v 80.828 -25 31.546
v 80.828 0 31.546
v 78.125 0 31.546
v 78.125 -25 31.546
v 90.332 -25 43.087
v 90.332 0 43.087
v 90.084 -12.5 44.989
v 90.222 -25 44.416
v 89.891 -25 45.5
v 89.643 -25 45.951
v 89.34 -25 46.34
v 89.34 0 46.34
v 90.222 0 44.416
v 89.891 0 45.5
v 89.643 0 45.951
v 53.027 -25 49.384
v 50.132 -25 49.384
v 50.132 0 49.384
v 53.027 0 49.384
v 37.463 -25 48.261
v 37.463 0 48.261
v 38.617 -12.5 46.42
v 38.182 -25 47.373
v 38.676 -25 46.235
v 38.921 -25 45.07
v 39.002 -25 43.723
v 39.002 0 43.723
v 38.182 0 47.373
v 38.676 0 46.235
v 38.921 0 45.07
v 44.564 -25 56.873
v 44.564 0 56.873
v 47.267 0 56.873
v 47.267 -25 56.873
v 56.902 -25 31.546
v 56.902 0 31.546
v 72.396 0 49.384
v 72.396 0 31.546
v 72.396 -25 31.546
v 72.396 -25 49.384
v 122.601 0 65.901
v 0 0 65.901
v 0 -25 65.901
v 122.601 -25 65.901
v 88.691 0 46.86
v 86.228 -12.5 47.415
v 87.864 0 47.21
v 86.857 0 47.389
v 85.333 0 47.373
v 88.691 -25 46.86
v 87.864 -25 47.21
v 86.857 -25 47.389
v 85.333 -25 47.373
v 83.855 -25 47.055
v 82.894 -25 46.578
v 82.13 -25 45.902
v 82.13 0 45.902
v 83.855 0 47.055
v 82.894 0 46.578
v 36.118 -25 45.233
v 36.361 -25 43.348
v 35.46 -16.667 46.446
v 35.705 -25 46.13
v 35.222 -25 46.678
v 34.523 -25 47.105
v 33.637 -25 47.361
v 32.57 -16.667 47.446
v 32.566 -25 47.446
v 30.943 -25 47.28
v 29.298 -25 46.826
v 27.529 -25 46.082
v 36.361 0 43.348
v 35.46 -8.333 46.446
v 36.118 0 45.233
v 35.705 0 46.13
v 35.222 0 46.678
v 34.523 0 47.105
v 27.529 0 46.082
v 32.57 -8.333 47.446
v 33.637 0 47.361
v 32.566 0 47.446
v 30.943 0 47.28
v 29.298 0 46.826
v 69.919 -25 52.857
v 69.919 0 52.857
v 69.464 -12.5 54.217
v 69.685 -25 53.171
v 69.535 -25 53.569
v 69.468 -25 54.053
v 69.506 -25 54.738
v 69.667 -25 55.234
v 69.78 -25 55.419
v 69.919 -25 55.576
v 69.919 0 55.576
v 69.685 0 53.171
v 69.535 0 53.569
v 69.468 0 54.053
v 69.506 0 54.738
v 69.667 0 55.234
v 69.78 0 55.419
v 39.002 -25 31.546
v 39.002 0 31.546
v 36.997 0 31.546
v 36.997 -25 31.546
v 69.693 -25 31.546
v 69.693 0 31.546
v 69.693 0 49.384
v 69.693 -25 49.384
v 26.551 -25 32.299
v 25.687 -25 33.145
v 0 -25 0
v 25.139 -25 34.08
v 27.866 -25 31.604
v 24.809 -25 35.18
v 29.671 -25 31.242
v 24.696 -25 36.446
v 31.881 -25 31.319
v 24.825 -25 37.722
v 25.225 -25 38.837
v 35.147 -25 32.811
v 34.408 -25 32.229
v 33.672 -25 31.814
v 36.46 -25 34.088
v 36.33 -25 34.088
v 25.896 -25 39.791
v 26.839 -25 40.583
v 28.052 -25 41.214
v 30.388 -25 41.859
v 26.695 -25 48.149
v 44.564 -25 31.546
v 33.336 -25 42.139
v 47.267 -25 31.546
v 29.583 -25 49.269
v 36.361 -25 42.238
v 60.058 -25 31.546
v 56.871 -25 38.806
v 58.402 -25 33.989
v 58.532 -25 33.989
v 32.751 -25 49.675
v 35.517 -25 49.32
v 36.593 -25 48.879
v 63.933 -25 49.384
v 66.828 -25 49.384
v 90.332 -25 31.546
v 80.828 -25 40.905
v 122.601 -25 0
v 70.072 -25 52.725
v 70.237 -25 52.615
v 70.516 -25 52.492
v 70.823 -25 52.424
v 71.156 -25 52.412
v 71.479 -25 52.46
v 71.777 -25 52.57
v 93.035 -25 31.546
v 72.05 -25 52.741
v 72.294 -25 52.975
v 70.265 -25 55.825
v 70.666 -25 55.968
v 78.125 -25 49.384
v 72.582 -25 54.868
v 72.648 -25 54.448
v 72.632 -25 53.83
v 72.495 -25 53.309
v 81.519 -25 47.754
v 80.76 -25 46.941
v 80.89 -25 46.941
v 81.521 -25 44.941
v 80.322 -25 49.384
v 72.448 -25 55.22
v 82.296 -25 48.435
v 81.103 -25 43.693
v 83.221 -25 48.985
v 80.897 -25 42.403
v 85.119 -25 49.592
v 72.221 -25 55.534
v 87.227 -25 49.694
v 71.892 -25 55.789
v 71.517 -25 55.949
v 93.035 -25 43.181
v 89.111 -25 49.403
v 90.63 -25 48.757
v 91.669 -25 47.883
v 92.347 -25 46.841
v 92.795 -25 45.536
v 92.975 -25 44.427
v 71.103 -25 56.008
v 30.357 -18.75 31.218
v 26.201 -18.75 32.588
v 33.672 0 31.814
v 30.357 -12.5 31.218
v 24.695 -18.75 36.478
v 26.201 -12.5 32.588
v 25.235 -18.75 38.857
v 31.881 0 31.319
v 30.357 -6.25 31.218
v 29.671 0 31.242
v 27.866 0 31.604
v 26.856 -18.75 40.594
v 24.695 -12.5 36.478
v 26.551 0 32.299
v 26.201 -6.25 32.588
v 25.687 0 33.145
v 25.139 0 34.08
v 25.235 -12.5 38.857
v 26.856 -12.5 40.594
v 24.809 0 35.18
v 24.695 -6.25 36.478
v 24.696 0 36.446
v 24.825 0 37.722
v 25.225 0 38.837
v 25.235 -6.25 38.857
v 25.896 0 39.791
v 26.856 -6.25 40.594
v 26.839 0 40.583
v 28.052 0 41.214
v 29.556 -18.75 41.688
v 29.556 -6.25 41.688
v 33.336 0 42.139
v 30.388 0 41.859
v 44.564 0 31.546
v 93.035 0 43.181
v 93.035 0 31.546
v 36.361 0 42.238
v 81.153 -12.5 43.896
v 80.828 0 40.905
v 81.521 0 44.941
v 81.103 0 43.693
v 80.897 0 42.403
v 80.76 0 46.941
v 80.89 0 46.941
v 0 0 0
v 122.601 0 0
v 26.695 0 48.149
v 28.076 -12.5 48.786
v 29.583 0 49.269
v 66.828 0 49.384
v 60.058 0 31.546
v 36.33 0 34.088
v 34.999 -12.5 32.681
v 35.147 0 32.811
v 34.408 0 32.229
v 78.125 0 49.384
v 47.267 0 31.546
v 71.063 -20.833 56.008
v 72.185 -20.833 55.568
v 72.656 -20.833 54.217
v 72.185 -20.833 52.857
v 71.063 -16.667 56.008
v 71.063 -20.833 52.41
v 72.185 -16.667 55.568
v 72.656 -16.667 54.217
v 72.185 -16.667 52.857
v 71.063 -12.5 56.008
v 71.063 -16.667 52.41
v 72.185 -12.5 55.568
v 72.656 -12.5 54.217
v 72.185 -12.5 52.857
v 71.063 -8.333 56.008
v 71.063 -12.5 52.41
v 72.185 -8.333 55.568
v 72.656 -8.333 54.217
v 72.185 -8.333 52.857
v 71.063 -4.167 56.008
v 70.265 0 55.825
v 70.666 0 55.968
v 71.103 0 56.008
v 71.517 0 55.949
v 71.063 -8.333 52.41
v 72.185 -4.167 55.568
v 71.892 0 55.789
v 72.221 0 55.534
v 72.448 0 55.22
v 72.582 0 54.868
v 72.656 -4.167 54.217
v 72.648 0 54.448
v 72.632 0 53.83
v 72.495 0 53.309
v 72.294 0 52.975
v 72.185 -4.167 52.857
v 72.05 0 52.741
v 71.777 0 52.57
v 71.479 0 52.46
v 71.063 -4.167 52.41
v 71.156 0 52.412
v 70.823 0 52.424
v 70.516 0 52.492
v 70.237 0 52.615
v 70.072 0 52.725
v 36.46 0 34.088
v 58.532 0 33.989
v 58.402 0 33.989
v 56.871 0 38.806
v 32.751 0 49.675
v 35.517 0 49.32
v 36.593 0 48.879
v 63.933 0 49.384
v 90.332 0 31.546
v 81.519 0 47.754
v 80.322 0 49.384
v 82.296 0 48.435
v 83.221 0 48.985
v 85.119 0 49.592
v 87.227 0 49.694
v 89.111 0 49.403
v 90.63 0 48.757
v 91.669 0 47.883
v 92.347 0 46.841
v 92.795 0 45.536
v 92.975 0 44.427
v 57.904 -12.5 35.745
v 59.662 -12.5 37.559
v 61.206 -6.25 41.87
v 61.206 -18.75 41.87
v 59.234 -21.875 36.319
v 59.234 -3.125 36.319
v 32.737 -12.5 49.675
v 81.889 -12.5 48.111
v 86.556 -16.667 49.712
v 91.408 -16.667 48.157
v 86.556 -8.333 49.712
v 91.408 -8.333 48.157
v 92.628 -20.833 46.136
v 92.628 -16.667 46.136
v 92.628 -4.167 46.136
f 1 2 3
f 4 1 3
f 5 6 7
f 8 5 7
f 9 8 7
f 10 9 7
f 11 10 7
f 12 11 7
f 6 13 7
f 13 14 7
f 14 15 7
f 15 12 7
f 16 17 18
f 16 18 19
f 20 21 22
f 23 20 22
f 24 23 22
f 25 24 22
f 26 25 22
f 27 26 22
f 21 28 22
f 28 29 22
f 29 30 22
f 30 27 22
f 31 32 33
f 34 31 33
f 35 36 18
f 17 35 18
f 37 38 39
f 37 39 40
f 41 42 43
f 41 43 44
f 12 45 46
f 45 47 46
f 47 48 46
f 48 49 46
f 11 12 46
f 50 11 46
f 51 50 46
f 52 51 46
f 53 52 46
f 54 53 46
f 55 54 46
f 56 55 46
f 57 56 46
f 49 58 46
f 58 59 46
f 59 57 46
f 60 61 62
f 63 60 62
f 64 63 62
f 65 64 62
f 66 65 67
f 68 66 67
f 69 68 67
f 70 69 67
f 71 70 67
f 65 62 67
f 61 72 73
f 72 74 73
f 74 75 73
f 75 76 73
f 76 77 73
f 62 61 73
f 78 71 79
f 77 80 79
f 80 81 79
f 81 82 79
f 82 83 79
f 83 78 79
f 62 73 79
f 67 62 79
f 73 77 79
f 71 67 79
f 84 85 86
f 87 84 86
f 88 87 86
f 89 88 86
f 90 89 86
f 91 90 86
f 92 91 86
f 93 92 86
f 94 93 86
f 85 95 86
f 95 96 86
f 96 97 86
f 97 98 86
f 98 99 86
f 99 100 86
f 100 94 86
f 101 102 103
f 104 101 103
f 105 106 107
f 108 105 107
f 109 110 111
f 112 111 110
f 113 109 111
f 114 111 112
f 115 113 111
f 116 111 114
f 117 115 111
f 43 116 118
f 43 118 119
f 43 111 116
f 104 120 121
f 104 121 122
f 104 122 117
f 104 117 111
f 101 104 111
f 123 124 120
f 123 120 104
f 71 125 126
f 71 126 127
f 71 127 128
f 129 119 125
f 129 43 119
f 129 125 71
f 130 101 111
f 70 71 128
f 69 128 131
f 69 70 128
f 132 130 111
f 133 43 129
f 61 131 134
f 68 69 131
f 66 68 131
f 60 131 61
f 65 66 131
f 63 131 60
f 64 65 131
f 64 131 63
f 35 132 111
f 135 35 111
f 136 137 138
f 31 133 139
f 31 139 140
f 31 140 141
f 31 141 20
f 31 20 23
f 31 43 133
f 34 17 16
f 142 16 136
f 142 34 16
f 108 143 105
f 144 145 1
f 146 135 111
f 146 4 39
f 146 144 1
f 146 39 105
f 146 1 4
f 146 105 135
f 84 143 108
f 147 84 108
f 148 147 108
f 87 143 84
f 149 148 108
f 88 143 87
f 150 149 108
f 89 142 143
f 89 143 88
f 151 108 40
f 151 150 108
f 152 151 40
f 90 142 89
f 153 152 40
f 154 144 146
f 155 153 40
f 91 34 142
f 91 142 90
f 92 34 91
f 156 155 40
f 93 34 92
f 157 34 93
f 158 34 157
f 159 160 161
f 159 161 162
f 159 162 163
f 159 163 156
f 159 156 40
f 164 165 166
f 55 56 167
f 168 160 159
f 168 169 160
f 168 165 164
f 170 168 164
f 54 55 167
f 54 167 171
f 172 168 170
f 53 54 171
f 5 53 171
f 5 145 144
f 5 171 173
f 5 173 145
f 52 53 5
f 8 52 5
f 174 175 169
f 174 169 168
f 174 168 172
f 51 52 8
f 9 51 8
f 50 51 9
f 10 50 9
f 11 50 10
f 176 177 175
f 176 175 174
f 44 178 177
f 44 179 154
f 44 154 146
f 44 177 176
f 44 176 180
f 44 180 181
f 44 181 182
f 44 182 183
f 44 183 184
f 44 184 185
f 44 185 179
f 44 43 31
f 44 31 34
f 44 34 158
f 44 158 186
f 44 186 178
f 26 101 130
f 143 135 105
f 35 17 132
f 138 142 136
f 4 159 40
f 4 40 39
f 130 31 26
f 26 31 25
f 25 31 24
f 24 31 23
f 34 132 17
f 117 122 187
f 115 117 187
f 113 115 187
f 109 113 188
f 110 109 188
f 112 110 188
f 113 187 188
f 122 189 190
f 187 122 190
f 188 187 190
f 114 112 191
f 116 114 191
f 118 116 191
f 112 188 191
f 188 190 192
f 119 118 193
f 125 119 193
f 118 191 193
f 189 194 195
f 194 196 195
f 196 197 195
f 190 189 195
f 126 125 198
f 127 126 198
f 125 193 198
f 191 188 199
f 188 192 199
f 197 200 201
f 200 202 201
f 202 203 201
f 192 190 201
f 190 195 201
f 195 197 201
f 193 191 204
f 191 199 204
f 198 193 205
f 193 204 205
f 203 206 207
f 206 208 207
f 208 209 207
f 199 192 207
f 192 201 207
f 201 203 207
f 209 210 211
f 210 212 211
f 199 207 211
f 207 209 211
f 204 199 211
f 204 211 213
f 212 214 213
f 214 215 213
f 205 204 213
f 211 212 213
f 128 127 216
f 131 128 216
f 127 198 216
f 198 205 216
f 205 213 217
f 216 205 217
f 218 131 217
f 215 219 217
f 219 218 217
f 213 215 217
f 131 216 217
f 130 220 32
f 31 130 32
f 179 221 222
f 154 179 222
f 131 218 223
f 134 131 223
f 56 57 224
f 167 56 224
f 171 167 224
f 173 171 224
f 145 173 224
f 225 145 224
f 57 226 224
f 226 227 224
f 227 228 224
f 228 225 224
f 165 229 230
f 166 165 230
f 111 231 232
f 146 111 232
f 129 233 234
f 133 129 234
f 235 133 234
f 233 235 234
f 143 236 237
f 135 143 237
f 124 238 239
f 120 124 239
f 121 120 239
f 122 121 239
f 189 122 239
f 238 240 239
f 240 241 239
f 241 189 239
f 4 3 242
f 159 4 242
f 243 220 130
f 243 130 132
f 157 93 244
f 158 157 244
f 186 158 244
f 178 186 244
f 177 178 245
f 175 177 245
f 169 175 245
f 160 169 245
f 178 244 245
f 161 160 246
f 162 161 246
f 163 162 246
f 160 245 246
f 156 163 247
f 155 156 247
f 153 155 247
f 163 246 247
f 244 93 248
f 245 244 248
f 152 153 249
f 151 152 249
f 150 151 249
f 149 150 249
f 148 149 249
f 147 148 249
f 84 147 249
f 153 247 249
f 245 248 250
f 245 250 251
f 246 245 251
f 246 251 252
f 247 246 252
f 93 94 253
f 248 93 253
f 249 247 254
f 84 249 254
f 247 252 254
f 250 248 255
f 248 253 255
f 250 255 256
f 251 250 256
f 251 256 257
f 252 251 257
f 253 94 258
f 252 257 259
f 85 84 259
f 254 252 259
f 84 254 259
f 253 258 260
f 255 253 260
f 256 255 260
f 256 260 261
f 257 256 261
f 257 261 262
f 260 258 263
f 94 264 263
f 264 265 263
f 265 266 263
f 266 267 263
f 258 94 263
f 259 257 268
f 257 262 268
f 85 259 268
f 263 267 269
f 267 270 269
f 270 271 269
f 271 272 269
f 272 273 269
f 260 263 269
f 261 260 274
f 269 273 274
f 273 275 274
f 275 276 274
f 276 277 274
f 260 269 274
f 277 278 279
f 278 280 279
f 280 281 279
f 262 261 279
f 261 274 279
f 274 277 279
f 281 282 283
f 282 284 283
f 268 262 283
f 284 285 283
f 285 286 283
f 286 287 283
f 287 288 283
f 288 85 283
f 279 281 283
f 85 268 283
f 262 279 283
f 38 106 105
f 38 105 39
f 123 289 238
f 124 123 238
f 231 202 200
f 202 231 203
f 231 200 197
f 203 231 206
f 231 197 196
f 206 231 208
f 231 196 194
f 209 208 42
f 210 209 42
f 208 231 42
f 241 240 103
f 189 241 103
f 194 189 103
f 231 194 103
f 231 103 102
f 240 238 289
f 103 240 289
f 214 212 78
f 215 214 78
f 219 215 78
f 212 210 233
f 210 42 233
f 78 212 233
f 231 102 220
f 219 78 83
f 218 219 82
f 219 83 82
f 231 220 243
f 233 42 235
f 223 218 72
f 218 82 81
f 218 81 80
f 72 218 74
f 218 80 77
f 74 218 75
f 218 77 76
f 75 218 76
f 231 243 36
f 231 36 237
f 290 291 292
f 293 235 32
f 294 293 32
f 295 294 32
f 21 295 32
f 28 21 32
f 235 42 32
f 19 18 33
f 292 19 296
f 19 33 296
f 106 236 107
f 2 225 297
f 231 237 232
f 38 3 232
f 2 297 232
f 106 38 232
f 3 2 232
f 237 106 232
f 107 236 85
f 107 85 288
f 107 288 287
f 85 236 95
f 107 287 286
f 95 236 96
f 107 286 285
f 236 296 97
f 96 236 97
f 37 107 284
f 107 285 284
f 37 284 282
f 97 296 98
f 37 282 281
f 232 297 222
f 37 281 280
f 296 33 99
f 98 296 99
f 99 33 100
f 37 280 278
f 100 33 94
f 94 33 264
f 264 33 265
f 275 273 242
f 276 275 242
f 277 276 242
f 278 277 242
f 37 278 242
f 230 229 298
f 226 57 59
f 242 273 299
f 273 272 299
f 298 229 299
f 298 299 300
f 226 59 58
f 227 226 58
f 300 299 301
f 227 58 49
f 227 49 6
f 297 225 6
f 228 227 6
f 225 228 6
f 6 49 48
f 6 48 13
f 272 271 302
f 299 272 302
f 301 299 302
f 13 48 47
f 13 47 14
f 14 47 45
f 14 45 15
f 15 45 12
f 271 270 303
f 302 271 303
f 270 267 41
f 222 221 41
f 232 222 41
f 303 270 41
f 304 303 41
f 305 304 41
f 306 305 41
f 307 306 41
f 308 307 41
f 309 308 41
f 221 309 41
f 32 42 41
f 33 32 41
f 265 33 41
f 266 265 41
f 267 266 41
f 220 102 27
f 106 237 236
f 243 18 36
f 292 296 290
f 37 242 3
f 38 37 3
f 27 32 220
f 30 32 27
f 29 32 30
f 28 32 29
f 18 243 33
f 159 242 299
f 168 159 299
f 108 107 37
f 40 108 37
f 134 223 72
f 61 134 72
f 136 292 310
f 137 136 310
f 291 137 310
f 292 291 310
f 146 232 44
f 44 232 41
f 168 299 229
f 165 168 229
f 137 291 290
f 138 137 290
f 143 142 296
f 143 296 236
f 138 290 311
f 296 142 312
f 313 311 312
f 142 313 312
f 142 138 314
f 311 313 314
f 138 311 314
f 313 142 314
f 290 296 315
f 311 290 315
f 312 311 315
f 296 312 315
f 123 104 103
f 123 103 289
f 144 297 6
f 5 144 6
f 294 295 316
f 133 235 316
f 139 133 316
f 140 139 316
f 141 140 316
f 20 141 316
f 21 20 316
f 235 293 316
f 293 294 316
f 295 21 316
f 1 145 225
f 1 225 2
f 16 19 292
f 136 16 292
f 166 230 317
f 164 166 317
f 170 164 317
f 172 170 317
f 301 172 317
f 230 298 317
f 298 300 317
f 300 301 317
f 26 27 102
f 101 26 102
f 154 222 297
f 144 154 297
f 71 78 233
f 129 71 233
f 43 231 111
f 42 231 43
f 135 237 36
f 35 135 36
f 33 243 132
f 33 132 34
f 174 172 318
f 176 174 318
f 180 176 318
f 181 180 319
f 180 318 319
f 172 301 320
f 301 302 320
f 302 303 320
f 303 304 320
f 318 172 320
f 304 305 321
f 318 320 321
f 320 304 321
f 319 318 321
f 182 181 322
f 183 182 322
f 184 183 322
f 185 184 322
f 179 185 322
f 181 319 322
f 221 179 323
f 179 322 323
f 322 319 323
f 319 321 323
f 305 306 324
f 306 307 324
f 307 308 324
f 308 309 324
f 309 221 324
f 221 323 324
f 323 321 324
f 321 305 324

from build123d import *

# Parameters (mm, degrees)
F1_W     = 122.6013228297
F1_H     = 65.9010410309
F1_W_2   = 2.7029693592
F1_H_2   = 25.326666655
F1_H_3   = 17.8375145576
F2_DEPTH = 25


with BuildPart() as f2:
    # F1 (on face) → F2 (new body)
    with BuildSketch(Plane.XZ):
        with Locations((61.3006614149, 32.9505205154)):
            Rectangle(F1_W, F1_H)
        with BuildLine():
            Line((39.001939275, 31.5462090075), (36.9968463977, 31.5462090075))
            Line((36.9968463977, 31.5462090075), (36.4604189526, 34.0877293299))
            Line((36.4604189526, 34.0877293299), (36.3302181164, 34.0877293299))
            add(Edge.make_bspline(
                [(36.3302181164, 34.0877293299), (34.9969615539, 32.4107425598), (33.6715170415, 31.81442273)],
                knots=[0, 0, 0, 1, 1, 1], degree=2))
            add(Edge.make_bspline(
                [(33.6715170415, 31.81442273), (32.3460725291, 31.2181029003), (30.3566037522, 31.2181029003)],
                knots=[0, 0, 0, 1, 1, 1], degree=2))
            add(Edge.make_bspline(
                [(30.3566037522, 31.2181029003), (27.7057147274, 31.2181029003), (26.2005930611, 32.587815697)],
                knots=[0, 0, 0, 1, 1, 1], degree=2))
            add(Edge.make_bspline(
                [(26.2005930611, 32.587815697), (24.6954713948, 33.9575284937), (24.6954713948, 36.4782166823)],
                knots=[0, 0, 0, 1, 1, 1], degree=2))
            add(Edge.make_bspline(
                [(24.6954713948, 36.4782166823), (24.6954713948, 41.8789473673), (33.3355988842, 42.1393490396)],
                knots=[0, 0, 0, 1, 1, 1], degree=2))
            Line((33.3355988842, 42.1393490396), (36.3614663171, 42.2383016751))
            Line((36.3614663171, 42.2383016751), (36.3614663171, 43.3476127995))
            add(Edge.make_bspline(
                [(36.3614663171, 43.3476127995), (36.3614663171, 45.4464502788), (35.4604765307, 46.4463927007)],
                knots=[0, 0, 0, 1, 1, 1], degree=2))
            add(Edge.make_bspline(
                [(35.4604765307, 46.4463927007), (34.5594867443, 47.4463351226), (32.5700179674, 47.4463351226)],
                knots=[0, 0, 0, 1, 1, 1], degree=2))
            add(Edge.make_bspline(
                [(32.5700179674, 47.4463351226), (30.3409796519, 47.4463351226), (27.5286415902, 46.0818303594)],
                knots=[0, 0, 0, 1, 1, 1], degree=2))
            Line((27.5286415902, 46.0818303594), (26.6953562386, 48.149419638))
            add(Edge.make_bspline(
                [(26.6953562386, 48.149419638), (28.0129887008, 48.8629202203), (29.5832107853, 49.2691468292)],
                knots=[0, 0, 0, 1, 1, 1], degree=2))
            add(Edge.make_bspline(
                [(29.5832107853, 49.2691468292), (31.1534328697, 49.6753734381), (32.7366750377, 49.6753734381)],
                knots=[0, 0, 0, 1, 1, 1], degree=2))
            add(Edge.make_bspline(
                [(32.7366750377, 49.6753734381), (35.9239915075, 49.6753734381), (37.4629653913, 48.2613923571)],
                knots=[0, 0, 0, 1, 1, 1], degree=2))
            add(Edge.make_bspline(
                [(37.4629653913, 48.2613923571), (39.001939275, 46.8474112762), (39.001939275, 43.7225912077)],
                knots=[0, 0, 0, 1, 1, 1], degree=2))
            Line((39.001939275, 43.7225912077), (39.001939275, 31.5462090075))
        make_face(mode=Mode.SUBTRACT)
        with BuildLine():
            Line((60.0580185031, 31.5462090075), (56.9019502339, 31.5462090075))
            Line((56.9019502339, 31.5462090075), (50.1315067522, 49.3837235651))
            Line((50.1315067522, 49.3837235651), (53.027173349, 49.3837235651))
            Line((53.027173349, 49.3837235651), (56.8707020332, 38.8062076333))
            add(Edge.make_bspline(
                [(56.8707020332, 38.8062076333), (58.1727103951, 35.0928797852), (58.4018638668, 33.9887766944)],
                knots=[0, 0, 0, 1, 1, 1], degree=2))
            Line((58.4018638668, 33.9887766944), (58.532064703, 33.9887766944))
            add(Edge.make_bspline(
                [(58.532064703, 33.9887766944), (58.7091378402, 34.8481022132), (59.6622079611, 37.5588836226)],
                knots=[0, 0, 0, 1, 1, 1], degree=2))
            add(Edge.make_bspline(
                [(59.6622079611, 37.5588836226), (60.615278082, 40.269665032), (63.932795388, 49.3837235651)],
                knots=[0, 0, 0, 1, 1, 1], degree=2))
            Line((63.932795388, 49.3837235651), (66.8284619848, 49.3837235651))
            Line((66.8284619848, 49.3837235651), (60.0580185031, 31.5462090075))
        make_face(mode=Mode.SUBTRACT)
        with Locations((45.9156036765, 44.209542335)):
            Rectangle(F1_W_2, F1_H_2, mode=Mode.SUBTRACT)
        with Locations((71.0443650605, 40.4649662863)):
            Rectangle(F1_W_2, F1_H_3, mode=Mode.SUBTRACT)
        with BuildLine():
            Line((93.0352862924, 31.5462090075), (90.3323169332, 31.5462090075))
            Line((90.3323169332, 31.5462090075), (90.3323169332, 43.0872111271))
            add(Edge.make_bspline(
                [(90.3323169332, 43.0872111271), (90.3323169332, 45.2641691081), (89.3401865615, 46.339628015)],
                knots=[0, 0, 0, 1, 1, 1], degree=2))
            add(Edge.make_bspline(
                [(89.3401865615, 46.339628015), (88.3480561897, 47.4150869219), (86.2283865766, 47.4150869219)],
                knots=[0, 0, 0, 1, 1, 1], degree=2))
            add(Edge.make_bspline(
                [(86.2283865766, 47.4150869219), (83.4316726153, 47.4150869219), (82.1296642534, 45.9021532054)],
                knots=[0, 0, 0, 1, 1, 1], degree=2))
            add(Edge.make_bspline(
                [(82.1296642534, 45.9021532054), (80.8276558916, 44.3892194889), (80.8276558916, 40.9050451126)],
                knots=[0, 0, 0, 1, 1, 1], degree=2))
            Line((80.8276558916, 40.9050451126), (80.8276558916, 31.5462090075))
            Line((80.8276558916, 31.5462090075), (78.1246865323, 31.5462090075))
            Line((78.1246865323, 31.5462090075), (78.1246865323, 49.3837235651))
            Line((78.1246865323, 49.3837235651), (80.3224766472, 49.3837235651))
            Line((80.3224766472, 49.3837235651), (80.7599514568, 46.9411558782))
            Line((80.7599514568, 46.9411558782), (80.8901522929, 46.9411558782))
            add(Edge.make_bspline(
                [(80.8901522929, 46.9411558782), (81.7234376445, 48.2587883404), (83.2207472607, 48.9853090063)],
                knots=[0, 0, 0, 1, 1, 1], degree=2))
            add(Edge.make_bspline(
                [(83.2207472607, 48.9853090063), (84.7180568768, 49.7118296723), (86.5564926838, 49.7118296723)],
                knots=[0, 0, 0, 1, 1, 1], degree=2))
            add(Edge.make_bspline(
                [(86.5564926838, 49.7118296723), (89.7802653878, 49.7118296723), (91.4077758401, 48.1572316882)],
                knots=[0, 0, 0, 1, 1, 1], degree=2))
            add(Edge.make_bspline(
                [(91.4077758401, 48.1572316882), (93.0352862924, 46.6026337041), (93.0352862924, 43.1809557291)],
                knots=[0, 0, 0, 1, 1, 1], degree=2))
            Line((93.0352862924, 43.1809557291), (93.0352862924, 31.5462090075))
        make_face(mode=Mode.SUBTRACT)
        with BuildLine():
            add(Edge.make_bspline(
                [(69.9194298359, 52.8574818745), (69.4637269092, 53.305372751), (69.4637269092, 54.2167786043)],
                knots=[0, 0, 0, 1, 1, 1], degree=2))
            add(Edge.make_bspline(
                [(69.4637269092, 54.2167786043), (69.4637269092, 55.143808558), (69.9194298359, 55.5760753341)],
                knots=[0, 0, 0, 1, 1, 1], degree=2))
            add(Edge.make_bspline(
                [(69.9194298359, 55.5760753341), (70.3751327625, 56.0083421102), (71.0625931776, 56.0083421102)],
                knots=[0, 0, 0, 1, 1, 1], degree=2))
            add(Edge.make_bspline(
                [(71.0625931776, 56.0083421102), (71.7135973585, 56.0083421102), (72.1849243855, 55.5682632839)],
                knots=[0, 0, 0, 1, 1, 1], degree=2))
            add(Edge.make_bspline(
                [(72.1849243855, 55.5682632839), (72.6562514125, 55.1281844576), (72.6562514125, 54.2167786043)],
                knots=[0, 0, 0, 1, 1, 1], degree=2))
            add(Edge.make_bspline(
                [(72.6562514125, 54.2167786043), (72.6562514125, 53.305372751), (72.1849243855, 52.8574818745)],
                knots=[0, 0, 0, 1, 1, 1], degree=2))
            add(Edge.make_bspline(
                [(72.1849243855, 52.8574818745), (71.7135973585, 52.409590998), (71.0625931776, 52.409590998)],
                knots=[0, 0, 0, 1, 1, 1], degree=2))
            add(Edge.make_bspline(
                [(71.0625931776, 52.409590998), (70.3751327625, 52.409590998), (69.9194298359, 52.8574818745)],
                knots=[0, 0, 0, 1, 1, 1], degree=2))
        make_face(mode=Mode.SUBTRACT)
    extrude(amount=F2_DEPTH)


solid = f2.part
